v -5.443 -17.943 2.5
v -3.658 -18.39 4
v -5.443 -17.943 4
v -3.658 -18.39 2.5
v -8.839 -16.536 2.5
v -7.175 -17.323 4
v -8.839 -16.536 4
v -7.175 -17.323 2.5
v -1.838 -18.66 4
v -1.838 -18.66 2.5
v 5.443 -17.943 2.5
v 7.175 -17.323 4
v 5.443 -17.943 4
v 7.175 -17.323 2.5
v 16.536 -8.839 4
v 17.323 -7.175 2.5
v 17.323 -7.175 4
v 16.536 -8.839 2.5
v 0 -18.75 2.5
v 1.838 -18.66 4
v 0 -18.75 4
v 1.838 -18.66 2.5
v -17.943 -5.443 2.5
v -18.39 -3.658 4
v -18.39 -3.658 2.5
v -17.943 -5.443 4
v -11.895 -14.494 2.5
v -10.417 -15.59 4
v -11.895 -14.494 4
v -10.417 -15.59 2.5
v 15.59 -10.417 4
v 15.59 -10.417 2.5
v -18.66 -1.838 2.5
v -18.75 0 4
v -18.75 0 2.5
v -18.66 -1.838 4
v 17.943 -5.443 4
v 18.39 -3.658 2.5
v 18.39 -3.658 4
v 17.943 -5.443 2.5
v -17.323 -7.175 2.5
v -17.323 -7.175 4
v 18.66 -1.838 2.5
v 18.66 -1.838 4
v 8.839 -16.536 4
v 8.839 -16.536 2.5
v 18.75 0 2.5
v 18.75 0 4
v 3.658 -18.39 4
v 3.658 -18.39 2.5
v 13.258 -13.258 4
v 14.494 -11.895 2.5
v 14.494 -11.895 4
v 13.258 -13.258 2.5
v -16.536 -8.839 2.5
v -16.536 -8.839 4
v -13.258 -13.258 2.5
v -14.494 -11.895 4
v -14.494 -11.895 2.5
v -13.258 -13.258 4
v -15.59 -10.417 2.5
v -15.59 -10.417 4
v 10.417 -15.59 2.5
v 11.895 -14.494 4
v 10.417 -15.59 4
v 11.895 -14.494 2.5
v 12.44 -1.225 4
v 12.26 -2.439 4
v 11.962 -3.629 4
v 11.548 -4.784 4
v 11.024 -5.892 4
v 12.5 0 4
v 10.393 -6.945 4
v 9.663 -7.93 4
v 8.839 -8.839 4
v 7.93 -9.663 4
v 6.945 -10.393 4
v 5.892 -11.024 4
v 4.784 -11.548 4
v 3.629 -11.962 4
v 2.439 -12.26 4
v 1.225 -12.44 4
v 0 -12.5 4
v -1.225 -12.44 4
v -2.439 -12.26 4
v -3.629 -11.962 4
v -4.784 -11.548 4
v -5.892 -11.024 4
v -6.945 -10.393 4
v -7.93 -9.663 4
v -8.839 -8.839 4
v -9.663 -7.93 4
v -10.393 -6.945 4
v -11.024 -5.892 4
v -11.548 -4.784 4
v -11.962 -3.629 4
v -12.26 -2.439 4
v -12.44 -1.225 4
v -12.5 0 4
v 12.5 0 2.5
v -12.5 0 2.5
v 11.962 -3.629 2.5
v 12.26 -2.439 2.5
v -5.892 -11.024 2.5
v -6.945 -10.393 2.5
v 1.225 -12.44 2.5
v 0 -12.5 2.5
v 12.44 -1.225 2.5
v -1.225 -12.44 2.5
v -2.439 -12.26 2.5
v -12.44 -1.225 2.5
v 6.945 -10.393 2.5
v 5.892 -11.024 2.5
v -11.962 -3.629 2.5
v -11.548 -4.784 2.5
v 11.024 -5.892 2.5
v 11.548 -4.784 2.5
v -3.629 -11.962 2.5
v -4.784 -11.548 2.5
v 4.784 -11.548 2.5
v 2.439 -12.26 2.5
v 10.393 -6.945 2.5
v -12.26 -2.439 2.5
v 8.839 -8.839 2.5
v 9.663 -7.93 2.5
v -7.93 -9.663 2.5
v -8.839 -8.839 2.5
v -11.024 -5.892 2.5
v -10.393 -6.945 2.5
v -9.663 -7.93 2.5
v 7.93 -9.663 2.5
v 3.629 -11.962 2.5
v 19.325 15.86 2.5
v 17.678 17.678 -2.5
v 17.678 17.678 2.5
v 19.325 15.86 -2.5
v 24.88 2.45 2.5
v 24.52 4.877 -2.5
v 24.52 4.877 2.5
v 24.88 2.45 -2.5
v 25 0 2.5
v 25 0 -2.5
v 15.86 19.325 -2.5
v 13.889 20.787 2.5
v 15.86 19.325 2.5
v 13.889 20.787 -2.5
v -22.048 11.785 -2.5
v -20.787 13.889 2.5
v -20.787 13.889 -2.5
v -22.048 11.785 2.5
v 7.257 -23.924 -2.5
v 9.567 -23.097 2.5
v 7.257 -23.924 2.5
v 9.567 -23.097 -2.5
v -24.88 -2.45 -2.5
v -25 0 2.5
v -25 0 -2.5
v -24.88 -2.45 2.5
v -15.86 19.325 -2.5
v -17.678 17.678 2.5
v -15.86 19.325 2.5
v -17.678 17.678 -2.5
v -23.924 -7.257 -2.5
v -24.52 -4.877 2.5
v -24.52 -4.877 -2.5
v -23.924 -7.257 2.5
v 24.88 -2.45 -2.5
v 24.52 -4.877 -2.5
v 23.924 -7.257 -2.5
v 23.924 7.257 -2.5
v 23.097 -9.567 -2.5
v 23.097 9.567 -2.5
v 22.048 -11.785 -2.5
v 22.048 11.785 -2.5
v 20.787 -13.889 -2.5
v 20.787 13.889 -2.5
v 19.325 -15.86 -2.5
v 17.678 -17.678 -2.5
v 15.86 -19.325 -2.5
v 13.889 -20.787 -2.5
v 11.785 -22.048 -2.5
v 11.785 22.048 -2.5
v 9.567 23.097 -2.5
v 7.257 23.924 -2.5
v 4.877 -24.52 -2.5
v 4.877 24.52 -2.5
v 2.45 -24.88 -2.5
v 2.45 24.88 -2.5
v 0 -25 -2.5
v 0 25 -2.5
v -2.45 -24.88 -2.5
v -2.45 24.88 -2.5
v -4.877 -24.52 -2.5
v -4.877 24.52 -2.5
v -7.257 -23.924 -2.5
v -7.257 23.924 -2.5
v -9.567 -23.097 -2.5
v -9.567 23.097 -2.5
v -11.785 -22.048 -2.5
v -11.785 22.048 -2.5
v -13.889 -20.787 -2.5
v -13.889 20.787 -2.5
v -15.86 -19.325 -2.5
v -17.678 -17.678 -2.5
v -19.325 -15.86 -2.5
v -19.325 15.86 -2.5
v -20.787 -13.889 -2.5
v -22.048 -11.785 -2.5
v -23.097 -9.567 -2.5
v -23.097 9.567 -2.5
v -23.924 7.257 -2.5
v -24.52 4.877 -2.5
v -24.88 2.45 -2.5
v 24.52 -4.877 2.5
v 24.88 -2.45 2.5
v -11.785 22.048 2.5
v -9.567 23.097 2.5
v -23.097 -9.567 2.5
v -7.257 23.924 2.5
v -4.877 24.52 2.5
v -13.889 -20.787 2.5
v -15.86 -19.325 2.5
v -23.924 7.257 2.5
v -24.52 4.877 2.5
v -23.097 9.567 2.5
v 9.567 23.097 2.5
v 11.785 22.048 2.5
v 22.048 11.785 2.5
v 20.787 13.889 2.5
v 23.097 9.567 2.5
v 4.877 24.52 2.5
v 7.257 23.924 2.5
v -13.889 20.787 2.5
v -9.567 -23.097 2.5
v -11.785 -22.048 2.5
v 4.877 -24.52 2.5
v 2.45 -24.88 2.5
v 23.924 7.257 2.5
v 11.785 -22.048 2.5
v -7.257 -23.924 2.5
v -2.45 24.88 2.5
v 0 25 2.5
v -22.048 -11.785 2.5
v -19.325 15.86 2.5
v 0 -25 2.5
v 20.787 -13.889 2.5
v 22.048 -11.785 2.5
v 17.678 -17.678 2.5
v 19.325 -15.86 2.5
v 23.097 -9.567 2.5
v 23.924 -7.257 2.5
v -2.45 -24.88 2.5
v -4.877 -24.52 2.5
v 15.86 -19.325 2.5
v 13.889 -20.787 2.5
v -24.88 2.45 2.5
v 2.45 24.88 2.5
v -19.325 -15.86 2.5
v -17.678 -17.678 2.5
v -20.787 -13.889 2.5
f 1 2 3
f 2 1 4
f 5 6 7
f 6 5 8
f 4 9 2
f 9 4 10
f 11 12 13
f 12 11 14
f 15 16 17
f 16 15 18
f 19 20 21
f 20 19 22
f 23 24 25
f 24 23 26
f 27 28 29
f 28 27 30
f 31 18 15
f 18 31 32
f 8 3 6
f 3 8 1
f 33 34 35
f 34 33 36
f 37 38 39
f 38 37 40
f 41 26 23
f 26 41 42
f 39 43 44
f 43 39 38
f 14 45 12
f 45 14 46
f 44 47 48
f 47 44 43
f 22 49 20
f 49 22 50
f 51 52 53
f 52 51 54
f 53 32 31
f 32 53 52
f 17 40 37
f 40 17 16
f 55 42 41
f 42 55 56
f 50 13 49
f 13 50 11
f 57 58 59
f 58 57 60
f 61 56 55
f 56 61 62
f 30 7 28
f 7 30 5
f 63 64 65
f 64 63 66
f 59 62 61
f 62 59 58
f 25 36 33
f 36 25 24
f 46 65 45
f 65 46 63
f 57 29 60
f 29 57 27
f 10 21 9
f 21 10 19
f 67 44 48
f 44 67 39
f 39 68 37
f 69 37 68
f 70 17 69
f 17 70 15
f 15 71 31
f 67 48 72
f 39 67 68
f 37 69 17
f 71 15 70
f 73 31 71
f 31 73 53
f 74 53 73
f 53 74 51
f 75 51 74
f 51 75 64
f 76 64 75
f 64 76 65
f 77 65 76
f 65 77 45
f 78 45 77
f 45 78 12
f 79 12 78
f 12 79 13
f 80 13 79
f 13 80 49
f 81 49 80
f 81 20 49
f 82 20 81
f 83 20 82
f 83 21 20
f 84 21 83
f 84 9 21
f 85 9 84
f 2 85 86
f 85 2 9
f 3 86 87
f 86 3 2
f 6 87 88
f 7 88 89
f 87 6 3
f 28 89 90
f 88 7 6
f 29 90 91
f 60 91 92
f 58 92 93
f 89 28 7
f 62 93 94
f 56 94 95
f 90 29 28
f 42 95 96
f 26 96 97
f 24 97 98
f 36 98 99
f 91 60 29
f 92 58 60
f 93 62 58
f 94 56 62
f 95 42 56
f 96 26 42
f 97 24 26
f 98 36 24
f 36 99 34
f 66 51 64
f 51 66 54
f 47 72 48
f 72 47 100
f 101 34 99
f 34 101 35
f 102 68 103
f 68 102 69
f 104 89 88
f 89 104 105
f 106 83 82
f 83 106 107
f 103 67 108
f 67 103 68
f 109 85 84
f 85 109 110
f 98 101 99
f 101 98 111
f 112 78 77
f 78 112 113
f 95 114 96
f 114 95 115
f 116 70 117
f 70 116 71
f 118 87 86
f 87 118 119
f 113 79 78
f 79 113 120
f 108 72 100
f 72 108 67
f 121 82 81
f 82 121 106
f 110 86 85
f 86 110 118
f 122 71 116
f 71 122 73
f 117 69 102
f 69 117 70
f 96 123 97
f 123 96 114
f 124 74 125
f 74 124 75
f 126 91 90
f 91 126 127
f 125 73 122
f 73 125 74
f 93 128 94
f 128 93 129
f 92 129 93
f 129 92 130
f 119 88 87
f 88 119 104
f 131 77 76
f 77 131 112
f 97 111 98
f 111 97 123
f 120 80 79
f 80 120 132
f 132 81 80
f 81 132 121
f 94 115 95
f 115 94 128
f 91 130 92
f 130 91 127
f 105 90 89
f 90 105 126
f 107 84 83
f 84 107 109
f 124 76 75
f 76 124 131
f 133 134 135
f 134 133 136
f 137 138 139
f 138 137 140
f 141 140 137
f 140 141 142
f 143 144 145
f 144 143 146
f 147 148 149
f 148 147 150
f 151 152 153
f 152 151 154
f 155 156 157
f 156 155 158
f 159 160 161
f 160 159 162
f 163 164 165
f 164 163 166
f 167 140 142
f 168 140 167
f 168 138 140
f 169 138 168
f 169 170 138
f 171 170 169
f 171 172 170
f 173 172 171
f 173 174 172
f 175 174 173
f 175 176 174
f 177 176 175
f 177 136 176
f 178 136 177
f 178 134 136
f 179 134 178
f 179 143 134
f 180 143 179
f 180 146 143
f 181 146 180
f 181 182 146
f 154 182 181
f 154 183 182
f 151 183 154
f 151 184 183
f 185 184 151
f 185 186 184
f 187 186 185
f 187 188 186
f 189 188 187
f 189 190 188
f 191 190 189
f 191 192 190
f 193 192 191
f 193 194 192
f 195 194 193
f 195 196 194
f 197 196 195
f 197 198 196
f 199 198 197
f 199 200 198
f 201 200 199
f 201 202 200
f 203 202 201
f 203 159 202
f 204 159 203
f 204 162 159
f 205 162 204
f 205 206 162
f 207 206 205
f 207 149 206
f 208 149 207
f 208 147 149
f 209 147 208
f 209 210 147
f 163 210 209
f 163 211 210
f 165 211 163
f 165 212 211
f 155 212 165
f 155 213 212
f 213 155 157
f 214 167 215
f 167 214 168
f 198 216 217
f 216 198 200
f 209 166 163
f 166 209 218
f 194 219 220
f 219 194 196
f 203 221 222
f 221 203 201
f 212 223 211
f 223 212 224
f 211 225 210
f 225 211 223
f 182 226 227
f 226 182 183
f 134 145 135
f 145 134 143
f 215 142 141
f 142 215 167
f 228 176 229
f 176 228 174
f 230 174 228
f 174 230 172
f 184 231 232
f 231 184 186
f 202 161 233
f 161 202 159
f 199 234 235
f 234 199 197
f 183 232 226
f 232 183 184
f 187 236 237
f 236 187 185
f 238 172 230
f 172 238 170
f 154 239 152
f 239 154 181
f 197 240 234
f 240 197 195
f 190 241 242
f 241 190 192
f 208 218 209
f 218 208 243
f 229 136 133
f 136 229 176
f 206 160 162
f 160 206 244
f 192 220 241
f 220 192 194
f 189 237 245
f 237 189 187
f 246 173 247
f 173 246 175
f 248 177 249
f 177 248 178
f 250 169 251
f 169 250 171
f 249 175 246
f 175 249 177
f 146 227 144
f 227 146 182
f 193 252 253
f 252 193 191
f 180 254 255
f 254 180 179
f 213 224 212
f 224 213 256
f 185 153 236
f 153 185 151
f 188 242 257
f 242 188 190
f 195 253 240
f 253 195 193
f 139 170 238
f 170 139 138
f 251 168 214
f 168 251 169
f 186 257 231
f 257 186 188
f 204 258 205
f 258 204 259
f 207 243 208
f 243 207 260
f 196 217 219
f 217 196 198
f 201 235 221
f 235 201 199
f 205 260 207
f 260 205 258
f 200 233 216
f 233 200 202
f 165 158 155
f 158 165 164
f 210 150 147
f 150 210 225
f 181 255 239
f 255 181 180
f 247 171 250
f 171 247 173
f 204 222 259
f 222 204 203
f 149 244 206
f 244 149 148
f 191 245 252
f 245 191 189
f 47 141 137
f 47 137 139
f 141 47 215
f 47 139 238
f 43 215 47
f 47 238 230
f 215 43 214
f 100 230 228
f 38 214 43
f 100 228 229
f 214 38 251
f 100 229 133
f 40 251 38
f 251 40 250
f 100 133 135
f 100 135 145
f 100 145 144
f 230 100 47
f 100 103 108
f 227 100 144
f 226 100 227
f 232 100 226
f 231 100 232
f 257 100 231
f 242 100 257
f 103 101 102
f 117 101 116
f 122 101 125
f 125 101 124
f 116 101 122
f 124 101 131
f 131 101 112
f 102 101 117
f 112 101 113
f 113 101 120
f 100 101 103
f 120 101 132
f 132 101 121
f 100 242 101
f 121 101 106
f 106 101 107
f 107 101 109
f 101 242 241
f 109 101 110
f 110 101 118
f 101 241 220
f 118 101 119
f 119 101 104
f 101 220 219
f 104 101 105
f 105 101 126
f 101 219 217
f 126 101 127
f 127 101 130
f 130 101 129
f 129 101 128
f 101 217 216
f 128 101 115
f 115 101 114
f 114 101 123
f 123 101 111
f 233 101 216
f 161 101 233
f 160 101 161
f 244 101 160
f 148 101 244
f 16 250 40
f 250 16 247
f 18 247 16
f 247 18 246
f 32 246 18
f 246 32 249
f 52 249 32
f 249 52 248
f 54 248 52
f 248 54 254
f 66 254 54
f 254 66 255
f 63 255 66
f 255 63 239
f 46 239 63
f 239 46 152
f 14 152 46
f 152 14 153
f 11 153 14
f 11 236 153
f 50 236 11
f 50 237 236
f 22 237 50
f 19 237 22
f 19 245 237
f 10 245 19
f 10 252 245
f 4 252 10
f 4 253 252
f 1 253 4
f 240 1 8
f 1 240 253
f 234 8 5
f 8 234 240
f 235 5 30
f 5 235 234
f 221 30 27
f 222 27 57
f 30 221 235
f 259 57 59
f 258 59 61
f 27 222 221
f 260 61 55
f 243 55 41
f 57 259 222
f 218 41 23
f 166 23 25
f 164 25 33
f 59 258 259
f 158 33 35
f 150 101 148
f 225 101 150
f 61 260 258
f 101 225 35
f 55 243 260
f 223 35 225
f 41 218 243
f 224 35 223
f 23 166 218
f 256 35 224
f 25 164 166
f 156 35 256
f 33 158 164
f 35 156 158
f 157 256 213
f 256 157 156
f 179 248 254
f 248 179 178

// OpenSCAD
MouthX=0;//[-200:200]
MouthY=0;//[-200:200]
//Does He have a big mouth?
MouthSize=25;//[25:100]
//Rotating the mouth 180 makes it a sad face instead of a happy face.
MouthRotate=0;//[0:364]



//How strong is the emotion?
Mouth="Very";//[Super,Very]
height=5;
radius=25;
thing(Mouth, height,radius,MouthSize,MouthX);

module thing(Mouth){
$fn=64;

	color([0,1,1])
	cylinder(h=height,r=radius,center=true);

	if (Mouth=="Super"){
rotate([0,0,MouthRotate])		
1happyMouth( );
	}else if (Mouth=="Very"){
rotate([0,0,MouthRotate])		
happyMouth( );
	}
}


module 1happyMouth(){

translate([MouthX,MouthY,height/2]){
	difference(){
		cylinder(r=MouthSize-MouthSize/4,h=2,center=true);
		translate([MouthX,23,0])
		cube([1000,MouthSize*2,100],center=true);
}
}	
}




module happyMouth( ){
translate([MouthX,MouthY,height/2]){
	difference(){
		cylinder(r=MouthSize-MouthSize/4,h=3,center=true);
		translate([MouthX,17.5,0])
		cube([500,MouthSize+10,20],center=true);
		cylinder(r=MouthSize/2,h=20,center=true);
	}
}
}
